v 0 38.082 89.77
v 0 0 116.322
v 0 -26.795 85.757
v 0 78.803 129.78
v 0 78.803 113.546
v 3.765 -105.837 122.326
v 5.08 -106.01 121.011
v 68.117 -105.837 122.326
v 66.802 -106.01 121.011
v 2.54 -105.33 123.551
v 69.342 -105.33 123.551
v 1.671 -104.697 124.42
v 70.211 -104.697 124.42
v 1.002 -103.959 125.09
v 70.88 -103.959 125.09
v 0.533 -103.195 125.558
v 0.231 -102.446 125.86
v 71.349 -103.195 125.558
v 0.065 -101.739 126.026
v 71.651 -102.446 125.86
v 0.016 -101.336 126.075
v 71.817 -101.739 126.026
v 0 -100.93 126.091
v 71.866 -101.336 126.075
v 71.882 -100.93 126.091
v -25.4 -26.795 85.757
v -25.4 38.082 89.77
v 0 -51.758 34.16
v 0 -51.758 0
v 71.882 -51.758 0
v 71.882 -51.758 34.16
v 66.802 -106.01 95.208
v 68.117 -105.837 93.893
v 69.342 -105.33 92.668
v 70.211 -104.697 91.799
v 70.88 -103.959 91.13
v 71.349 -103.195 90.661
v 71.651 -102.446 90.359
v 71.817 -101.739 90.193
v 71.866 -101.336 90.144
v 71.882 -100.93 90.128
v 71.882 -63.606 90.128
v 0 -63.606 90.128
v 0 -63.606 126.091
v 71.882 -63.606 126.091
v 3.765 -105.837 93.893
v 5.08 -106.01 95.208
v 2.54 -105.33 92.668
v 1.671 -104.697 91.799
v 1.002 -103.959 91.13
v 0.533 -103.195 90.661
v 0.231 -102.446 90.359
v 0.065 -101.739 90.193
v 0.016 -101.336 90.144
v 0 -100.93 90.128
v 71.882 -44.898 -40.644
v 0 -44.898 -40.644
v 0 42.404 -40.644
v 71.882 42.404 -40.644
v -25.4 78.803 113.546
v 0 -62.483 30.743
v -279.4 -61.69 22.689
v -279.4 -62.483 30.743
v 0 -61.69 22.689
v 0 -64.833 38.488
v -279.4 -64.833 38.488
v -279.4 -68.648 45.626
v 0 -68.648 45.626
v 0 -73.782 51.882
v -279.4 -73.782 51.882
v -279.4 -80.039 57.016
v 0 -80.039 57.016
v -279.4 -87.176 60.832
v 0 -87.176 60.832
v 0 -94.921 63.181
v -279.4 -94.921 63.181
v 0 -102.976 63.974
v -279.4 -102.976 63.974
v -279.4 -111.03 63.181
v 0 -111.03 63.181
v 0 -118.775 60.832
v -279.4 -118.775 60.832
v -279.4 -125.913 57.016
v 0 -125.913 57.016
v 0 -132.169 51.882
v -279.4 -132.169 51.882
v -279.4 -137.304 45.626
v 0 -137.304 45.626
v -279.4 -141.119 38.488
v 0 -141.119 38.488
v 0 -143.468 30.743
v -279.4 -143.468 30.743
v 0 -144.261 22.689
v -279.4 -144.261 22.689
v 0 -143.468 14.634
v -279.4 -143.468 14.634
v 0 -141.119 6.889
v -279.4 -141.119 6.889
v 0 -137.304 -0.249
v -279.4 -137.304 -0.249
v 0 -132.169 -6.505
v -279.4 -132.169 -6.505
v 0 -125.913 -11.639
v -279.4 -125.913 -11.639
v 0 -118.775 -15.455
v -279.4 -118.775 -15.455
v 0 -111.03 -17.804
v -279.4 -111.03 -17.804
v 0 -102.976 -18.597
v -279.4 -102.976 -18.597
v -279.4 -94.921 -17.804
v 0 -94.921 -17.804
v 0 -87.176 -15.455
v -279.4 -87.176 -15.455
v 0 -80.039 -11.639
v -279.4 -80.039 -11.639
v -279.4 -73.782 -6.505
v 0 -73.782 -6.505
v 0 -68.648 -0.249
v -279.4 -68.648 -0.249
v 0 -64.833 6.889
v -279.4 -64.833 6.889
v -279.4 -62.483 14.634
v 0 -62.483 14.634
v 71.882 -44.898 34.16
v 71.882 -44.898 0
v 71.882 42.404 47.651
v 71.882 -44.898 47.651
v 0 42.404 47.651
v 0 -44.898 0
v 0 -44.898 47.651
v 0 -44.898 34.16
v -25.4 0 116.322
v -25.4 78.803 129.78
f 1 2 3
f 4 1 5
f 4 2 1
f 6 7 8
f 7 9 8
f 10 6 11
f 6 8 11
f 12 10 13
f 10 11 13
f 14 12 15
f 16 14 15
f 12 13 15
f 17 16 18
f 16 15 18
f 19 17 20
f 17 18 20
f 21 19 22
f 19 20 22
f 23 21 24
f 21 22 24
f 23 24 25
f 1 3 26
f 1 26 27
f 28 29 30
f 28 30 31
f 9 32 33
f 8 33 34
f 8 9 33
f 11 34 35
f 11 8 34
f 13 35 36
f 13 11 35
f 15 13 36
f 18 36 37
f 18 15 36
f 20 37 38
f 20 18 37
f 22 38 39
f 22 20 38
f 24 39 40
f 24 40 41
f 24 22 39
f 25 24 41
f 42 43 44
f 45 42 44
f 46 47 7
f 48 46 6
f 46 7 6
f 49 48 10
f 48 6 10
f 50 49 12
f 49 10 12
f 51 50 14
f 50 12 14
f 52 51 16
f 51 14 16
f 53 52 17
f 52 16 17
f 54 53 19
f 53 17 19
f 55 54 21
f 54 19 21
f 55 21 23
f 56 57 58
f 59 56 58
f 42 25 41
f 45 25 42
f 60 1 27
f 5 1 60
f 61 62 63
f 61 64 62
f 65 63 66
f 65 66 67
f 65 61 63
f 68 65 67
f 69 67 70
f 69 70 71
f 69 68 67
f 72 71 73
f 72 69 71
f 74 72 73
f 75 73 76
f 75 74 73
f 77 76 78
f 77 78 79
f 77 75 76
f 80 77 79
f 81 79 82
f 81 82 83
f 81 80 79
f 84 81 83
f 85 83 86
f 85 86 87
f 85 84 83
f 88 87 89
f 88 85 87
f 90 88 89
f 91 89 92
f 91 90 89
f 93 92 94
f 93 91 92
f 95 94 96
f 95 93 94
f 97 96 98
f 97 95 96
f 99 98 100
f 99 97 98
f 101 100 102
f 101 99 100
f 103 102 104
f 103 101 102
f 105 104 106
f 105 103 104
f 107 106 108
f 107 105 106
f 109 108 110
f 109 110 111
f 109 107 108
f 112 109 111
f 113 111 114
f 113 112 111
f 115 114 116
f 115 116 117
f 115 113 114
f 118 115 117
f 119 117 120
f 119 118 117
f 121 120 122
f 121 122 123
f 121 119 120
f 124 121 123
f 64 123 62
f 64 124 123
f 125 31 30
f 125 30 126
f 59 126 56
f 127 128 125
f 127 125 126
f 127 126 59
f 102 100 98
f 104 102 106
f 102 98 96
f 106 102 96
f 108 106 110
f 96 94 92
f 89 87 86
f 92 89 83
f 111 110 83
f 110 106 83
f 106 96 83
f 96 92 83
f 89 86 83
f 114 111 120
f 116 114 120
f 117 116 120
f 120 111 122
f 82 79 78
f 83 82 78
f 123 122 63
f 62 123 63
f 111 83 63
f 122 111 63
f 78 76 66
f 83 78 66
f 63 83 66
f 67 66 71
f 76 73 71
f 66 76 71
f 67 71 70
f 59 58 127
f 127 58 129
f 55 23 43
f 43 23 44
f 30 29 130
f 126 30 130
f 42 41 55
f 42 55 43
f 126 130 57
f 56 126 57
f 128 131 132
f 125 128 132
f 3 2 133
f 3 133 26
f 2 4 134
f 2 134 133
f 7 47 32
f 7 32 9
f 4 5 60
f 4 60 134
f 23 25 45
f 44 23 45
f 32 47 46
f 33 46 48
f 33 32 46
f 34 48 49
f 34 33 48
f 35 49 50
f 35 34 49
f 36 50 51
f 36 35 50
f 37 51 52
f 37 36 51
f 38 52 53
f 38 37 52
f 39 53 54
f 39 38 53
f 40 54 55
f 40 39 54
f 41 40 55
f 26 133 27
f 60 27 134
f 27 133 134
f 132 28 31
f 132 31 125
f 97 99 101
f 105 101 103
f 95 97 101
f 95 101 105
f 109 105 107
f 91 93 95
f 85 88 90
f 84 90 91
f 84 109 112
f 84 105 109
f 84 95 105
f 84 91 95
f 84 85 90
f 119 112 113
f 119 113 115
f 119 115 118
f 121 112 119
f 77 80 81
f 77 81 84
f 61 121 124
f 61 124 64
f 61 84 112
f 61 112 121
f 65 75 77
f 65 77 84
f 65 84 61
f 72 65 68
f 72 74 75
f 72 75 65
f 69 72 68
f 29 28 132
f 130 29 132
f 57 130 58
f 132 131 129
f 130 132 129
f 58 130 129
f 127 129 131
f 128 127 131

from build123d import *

# Parameters (mm, degrees)
F0_W     = 44.8984839022
F0_H     = 34.1596789658
F0_W_2   = 6.8594999611
F1_DEPTH = 71.882
F0_W_3   = 42.4041450024
F0_H_2   = 35.9633043408
F2_R     = 5.08
F4_DEPTH = 25.4
F3_R     = 41.2858066076
F5_DEPTH = 254


with BuildPart() as f1:
    # F0 (on Right) → F1 (new body)
    with BuildSketch(Plane.YZ):
        Polygon((42.4041338265, 47.6513393223), (-44.8984839022, 47.6513393223), (-44.8984839022, 34.1596789658), (0, 34.1596789658), (0, 0), (-44.8984839022, 0), (-44.8984839022, -40.6436882913), (42.4041338265, -40.6436882913), align=None)
        with Locations((-22.4492419511, 17.0798394829)):
            Rectangle(F0_W, F0_H)
        with Locations((-48.3282338828, 17.0798394829)):
            Rectangle(F0_W_2, F0_H)
    extrude(amount=F1_DEPTH)


with BuildPart() as f1b:
    # F0 (on Right) → F1, piece 2 (new body)
    with BuildSketch(Plane.YZ):
        with Locations((-84.8082602024, 108.1095896661)):
            Rectangle(F0_W_3, F0_H_2)
    extrude(amount=F1_DEPTH)

    # F2
    f2_edges = [f1b.edges().sort_by_distance(p)[0] for p in [
        (35.941, -106.010333, 126.091242),
        (35.941, -106.010333, 90.127937),
        (0, -106.010333, 108.10959),
        (71.882, -106.010333, 108.10959),
    ]]
    fillet(f2_edges, radius=F2_R)


with BuildPart() as f4:
    # F3 (on Right) → F4 (new body)
    with BuildSketch(Plane.YZ):
        Polygon((38.082100451, 89.7703766823), (78.8031518459, 113.5458573699), (78.8031518459, 129.7803670168), (0, 116.321593523), (-26.7950557172, 85.757240653), align=None)
    extrude(amount=-F4_DEPTH)


with BuildPart() as f4b:
    # F3 (on Right) → F4, piece 2 (new body)
    with BuildSketch(Plane.YZ):
        with Locations((-102.975666523, 22.6885396987)):
            Circle(F3_R)
    extrude(amount=-F4_DEPTH)

    # F5 (add): a face of the model
    f5_faces = [f4b.faces().sort_by_distance(p)[0] for p in [
        (-25.4, -102.975666523, 22.6885396987),
    ]]
    extrude(f5_faces, amount=F5_DEPTH)


solid = Compound([f1.part, f1b.part, f4.part, f4b.part])
